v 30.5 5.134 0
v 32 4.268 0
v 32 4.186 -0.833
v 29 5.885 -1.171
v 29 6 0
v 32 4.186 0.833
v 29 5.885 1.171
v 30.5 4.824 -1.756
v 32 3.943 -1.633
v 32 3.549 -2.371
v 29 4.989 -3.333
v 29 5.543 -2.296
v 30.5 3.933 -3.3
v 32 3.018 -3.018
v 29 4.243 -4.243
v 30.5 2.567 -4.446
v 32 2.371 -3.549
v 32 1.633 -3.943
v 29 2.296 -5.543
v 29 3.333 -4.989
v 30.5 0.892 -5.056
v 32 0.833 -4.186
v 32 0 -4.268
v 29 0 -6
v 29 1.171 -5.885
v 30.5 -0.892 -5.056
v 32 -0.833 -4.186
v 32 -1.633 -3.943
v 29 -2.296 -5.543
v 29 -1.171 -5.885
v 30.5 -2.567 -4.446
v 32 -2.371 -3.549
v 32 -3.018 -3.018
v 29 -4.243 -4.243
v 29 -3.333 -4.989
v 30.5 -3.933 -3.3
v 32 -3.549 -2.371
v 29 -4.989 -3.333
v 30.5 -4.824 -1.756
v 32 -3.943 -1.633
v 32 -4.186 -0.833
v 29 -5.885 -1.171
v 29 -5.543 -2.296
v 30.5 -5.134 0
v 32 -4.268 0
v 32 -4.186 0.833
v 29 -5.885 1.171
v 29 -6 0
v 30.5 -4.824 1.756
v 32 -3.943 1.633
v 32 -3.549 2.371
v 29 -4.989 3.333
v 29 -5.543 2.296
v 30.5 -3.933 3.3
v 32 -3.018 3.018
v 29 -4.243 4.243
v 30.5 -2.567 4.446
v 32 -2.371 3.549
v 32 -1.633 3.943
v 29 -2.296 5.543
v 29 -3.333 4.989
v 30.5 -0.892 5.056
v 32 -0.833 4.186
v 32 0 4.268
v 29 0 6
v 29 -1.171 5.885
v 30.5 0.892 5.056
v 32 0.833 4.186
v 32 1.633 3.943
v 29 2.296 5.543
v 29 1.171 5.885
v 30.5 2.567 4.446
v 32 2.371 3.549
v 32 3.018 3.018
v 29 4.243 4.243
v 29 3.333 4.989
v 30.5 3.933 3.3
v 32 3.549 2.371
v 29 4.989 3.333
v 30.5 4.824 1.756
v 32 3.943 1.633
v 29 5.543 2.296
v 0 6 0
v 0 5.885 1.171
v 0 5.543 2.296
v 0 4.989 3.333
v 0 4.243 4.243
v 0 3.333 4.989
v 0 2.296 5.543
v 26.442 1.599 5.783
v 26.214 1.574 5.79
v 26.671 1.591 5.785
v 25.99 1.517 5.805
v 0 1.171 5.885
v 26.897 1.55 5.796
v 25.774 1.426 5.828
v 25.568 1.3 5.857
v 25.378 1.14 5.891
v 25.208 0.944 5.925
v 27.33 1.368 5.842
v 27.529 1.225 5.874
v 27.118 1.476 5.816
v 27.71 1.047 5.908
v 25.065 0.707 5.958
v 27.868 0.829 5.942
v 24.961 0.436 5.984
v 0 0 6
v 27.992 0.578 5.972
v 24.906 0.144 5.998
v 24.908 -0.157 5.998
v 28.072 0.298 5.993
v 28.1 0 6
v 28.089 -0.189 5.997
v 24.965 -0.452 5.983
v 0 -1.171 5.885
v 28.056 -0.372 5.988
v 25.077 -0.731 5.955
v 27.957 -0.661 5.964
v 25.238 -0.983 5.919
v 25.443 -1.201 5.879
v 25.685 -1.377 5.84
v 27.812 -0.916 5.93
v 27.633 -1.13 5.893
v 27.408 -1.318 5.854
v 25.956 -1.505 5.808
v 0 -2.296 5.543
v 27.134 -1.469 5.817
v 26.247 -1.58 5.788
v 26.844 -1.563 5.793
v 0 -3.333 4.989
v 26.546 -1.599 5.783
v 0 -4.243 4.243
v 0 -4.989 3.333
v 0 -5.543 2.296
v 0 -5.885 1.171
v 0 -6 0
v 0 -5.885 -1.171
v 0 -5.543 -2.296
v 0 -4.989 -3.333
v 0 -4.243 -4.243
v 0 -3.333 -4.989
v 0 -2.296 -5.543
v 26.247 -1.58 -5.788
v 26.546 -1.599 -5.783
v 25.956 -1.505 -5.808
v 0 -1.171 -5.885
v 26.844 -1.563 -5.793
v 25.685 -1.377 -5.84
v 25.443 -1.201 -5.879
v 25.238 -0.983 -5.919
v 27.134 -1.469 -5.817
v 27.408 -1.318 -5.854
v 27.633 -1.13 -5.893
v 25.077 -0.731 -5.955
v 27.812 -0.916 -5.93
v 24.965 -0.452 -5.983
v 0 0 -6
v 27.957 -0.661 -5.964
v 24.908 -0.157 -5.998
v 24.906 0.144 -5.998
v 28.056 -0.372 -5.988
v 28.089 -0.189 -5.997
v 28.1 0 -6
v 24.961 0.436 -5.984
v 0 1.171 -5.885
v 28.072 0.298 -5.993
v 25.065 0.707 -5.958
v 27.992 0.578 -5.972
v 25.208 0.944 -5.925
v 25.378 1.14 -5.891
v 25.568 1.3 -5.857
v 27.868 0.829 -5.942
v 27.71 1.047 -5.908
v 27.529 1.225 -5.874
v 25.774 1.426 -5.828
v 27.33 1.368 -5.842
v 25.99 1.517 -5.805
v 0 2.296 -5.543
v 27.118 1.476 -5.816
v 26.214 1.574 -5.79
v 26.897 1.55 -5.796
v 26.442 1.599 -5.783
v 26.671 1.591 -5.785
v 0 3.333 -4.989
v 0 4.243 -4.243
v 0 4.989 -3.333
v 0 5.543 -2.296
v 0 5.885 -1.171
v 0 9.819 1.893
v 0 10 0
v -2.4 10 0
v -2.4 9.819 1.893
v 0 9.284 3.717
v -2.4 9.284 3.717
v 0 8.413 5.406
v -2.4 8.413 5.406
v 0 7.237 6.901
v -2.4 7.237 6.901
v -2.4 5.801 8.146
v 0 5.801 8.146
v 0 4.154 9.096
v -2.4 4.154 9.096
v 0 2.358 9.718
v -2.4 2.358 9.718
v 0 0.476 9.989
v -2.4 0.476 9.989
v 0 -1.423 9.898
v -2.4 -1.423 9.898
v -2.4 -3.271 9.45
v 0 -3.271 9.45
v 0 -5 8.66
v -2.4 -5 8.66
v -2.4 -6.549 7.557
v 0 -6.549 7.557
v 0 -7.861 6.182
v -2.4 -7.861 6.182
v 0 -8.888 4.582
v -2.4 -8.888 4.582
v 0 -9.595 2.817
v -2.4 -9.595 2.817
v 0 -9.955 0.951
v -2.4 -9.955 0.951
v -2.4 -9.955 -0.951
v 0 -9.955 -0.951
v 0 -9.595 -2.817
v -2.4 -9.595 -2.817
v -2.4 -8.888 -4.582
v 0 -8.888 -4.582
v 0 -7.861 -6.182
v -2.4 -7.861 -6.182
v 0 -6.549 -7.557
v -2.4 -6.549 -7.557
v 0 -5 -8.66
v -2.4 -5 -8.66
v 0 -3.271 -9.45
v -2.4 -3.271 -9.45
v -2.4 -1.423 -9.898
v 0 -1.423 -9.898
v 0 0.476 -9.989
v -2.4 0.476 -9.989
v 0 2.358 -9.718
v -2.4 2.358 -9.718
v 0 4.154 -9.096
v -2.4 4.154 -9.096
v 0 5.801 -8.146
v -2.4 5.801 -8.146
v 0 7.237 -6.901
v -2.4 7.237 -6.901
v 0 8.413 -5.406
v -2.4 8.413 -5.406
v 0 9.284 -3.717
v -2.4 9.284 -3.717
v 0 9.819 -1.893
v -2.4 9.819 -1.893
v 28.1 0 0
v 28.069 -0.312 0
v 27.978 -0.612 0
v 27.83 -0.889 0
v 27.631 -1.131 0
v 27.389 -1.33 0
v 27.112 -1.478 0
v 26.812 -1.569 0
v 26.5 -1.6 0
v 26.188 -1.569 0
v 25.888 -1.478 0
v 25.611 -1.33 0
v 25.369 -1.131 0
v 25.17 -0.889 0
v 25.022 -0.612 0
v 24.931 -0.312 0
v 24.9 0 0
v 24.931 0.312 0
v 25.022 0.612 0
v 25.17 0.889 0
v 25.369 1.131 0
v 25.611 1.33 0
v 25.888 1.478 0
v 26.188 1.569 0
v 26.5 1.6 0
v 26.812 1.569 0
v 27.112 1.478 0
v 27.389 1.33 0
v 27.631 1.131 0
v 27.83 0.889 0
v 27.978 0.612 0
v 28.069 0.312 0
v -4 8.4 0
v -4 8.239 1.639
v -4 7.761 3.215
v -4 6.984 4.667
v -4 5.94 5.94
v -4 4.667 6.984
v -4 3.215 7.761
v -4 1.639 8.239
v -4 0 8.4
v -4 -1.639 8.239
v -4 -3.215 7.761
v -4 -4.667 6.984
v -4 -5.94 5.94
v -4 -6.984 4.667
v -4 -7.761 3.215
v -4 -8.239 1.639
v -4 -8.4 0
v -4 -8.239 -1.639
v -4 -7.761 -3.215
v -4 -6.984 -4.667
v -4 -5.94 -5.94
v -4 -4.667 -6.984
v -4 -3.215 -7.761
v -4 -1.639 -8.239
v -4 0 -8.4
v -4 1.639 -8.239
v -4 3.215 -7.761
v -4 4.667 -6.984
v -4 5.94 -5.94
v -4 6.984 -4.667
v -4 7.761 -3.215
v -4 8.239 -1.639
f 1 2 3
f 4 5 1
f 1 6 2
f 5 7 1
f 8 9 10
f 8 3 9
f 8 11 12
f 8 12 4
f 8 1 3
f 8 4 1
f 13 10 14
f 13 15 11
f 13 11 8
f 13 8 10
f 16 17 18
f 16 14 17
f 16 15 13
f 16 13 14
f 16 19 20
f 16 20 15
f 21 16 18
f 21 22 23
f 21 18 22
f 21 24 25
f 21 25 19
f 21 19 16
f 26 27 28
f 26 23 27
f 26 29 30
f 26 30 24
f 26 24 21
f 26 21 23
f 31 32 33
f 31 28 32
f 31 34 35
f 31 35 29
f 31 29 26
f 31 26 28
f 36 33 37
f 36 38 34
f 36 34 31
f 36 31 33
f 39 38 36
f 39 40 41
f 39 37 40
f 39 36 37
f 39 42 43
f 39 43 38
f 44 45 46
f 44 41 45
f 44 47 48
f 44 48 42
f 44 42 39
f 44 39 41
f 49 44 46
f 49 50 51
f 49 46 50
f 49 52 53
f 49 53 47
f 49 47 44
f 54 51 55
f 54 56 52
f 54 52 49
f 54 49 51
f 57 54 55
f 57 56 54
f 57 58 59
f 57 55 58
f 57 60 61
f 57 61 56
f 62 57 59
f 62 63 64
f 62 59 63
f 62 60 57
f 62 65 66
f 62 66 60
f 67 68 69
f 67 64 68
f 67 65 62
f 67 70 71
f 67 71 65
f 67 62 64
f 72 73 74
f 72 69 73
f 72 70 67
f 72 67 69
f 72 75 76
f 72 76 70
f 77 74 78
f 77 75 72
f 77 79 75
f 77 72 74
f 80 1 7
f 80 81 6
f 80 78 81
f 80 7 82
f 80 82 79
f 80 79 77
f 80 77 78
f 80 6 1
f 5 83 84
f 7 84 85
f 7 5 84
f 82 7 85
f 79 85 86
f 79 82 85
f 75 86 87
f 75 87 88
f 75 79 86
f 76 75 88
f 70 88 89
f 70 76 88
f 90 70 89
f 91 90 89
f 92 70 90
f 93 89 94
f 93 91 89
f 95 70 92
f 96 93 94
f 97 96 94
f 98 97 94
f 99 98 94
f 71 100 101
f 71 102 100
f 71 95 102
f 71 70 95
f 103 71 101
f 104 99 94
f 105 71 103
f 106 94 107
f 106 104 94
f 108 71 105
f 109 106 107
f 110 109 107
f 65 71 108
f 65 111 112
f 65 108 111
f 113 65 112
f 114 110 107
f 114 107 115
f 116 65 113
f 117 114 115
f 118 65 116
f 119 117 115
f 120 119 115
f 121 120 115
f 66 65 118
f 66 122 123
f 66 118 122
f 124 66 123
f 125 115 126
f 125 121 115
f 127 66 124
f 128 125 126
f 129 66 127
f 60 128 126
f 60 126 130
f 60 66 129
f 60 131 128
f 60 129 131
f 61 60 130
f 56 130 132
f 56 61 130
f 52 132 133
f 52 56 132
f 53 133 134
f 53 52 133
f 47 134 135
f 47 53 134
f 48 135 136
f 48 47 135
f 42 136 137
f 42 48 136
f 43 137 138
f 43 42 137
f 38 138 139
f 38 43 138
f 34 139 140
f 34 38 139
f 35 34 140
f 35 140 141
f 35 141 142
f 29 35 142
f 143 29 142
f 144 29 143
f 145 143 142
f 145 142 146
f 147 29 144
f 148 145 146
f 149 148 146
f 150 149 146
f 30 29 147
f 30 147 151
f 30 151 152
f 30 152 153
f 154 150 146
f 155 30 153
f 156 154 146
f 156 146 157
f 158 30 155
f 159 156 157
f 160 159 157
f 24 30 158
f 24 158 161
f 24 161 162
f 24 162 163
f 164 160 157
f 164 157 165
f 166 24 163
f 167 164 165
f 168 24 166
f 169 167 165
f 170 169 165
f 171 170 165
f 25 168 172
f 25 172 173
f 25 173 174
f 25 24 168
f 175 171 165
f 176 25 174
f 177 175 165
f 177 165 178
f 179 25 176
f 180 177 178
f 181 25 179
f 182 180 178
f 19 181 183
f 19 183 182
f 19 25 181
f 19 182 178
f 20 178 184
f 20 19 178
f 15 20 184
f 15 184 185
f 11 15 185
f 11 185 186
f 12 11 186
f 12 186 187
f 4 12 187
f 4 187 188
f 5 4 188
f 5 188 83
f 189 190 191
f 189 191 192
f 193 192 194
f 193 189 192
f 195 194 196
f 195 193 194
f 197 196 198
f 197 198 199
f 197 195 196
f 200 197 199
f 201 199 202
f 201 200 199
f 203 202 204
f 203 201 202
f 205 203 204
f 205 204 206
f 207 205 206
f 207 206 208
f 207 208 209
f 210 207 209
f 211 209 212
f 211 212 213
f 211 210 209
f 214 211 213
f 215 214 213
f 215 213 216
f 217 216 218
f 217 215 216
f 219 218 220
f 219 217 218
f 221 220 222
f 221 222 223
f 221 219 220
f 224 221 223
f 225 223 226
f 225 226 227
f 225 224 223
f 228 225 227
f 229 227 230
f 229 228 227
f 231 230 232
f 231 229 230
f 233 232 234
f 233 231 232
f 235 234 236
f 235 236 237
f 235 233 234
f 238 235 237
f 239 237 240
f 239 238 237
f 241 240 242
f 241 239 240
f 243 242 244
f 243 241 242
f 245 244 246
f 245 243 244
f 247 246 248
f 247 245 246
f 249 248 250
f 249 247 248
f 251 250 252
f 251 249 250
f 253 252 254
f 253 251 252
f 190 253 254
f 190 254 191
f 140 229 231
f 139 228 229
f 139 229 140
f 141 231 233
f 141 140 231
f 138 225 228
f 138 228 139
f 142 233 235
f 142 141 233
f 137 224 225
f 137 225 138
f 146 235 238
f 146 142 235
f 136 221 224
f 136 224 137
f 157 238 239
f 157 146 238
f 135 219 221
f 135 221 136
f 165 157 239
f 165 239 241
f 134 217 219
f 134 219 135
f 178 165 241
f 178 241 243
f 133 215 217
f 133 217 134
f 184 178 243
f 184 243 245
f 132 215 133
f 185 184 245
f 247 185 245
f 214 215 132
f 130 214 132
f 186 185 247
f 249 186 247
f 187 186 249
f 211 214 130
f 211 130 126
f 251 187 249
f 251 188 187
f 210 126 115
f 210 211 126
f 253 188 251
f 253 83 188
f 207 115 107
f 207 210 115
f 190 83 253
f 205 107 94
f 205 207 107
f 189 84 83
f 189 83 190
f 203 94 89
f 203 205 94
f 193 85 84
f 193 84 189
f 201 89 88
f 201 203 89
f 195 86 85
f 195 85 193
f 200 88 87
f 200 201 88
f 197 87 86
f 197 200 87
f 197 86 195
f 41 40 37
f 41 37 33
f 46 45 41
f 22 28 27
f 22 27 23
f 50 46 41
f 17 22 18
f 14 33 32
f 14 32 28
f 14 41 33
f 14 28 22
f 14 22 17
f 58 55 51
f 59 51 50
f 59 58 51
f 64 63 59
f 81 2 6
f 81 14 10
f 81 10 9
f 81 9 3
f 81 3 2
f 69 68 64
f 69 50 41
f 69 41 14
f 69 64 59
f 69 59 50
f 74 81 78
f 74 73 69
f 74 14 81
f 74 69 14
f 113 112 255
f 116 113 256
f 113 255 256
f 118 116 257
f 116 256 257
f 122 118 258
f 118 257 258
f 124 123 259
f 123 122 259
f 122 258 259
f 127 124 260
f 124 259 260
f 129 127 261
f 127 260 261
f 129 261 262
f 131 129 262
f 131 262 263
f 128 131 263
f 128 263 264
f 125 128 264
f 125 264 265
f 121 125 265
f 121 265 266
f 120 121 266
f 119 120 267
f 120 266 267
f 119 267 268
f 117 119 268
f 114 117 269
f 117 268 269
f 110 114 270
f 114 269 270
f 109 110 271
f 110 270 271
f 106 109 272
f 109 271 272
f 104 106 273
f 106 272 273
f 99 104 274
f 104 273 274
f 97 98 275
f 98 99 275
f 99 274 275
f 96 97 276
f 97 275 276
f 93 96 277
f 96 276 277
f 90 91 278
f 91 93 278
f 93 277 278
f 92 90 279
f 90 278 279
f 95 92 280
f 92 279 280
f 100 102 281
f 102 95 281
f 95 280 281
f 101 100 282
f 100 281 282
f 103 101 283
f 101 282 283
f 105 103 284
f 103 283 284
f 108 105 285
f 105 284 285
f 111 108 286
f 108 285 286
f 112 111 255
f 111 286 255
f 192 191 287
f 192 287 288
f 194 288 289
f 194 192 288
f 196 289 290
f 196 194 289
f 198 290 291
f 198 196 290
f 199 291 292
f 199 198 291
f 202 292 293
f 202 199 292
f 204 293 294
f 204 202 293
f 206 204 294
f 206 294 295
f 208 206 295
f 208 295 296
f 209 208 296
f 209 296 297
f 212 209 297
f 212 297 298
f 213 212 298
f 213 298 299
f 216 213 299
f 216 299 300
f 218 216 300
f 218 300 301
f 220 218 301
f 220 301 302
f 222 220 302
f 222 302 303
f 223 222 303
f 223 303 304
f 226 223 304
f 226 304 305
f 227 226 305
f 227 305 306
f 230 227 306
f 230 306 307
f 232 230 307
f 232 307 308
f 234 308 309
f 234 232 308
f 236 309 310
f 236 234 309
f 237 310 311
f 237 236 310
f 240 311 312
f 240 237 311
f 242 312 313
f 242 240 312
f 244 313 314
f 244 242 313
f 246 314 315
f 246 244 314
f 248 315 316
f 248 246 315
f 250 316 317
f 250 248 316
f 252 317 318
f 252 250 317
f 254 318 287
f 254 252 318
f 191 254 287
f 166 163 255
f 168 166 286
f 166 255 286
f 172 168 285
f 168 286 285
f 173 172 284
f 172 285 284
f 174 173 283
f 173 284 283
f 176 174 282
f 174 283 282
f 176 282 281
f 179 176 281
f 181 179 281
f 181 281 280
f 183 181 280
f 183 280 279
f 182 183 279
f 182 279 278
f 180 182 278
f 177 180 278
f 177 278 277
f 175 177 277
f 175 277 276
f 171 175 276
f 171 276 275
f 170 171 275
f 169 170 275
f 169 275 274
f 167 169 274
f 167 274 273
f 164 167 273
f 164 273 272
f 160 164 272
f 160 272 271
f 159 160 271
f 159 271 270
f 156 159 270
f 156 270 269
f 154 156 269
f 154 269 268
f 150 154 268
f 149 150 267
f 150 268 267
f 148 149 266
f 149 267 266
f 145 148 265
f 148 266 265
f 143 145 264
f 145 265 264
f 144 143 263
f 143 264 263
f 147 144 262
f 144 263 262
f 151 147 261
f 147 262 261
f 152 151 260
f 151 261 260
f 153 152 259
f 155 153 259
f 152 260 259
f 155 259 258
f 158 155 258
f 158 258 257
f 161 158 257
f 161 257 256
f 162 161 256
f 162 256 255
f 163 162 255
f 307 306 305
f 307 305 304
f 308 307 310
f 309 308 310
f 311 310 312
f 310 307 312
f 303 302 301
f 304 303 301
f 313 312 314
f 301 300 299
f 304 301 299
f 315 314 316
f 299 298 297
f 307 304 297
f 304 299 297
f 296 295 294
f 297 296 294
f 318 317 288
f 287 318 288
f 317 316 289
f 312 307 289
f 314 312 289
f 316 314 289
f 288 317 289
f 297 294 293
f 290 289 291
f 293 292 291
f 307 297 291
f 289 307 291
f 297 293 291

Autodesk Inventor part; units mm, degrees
ref_plane "YZ Plane" through (0, 0, 0) normal (1, 0, 0) x (0, 1, 0)
ref_plane "XZ Plane" through (0, 0, 0) normal (0, 1, 0) x (-1, 0, 0)
sketch "Skizze1" plane through (0, 0, 0) normal (0, 0, 1) x (1, 0, 0)
  line L0 (-4, 0) -> (-4, 10)
  line L1 (-4, 10) -> (0, 10)
  line L2 (0, 10) -> (0, 6)
  line L3 (0, 6) -> (32, 6)
  line L4 (32, 6) -> (32, 0)
  line L5 (-4, 0) -> (32, 0)
  line L6 (-4, 0) -> (17, 0) projected
  line L7 (0, -0.98) -> (0, 3.08) projected
  circle A0 centre (26.5, 0) radius 1.6
  dimension "d0" = 12
  dimension "d1" = 20
  dimension "d2" = 4
  dimension "d3" = 32
  dimension "d5" = 5.5
  dimension "d6" = 3.2
revolve "Körper" add sketch "Skizze1" angle 360 about axis through (-4, 0, 0) along (1, 0, 0) picked at (26.9216, 0.9202) contours L0 L1 L2 L3 L4 L5 A0 | A0 L5
extrude "Bohrung" cut sketch "Skizze1" along normal through all both and the other way through all contours A0 L5 | L5 A0
chamfer "Fase1" distance 1.6 angle 45 1 edges at (-4, -10, 0) measured on face at (-2.6667, 9.9676, -0.8047)
chamfer "Fase2" distance 3 angle 30 1 edges at (32, -6, 0) measured on face at (19.4513, 2.8362, 5.2873)
ref_plane "Work Plane1" through (16, 0, 6) normal (0, 0, 1) x (1, 0, 0)
equation "\"d0\" = NND"
equation "\"d1\" = KOD"
equation "\"d2\" = KOH"
equation "\"d3\" = NLG"
equation "\"d5\" = DIST"
equation "\"d6\" = BOR"
equation "\"d7\" = NND"
equation "\"d9\" = PHH2"
equation "\"d10\" = FAWI2"
equation "\"d16\" = PHH2"
equation "\"d11\" = PHH1"
equation "\"d12\" = FAWI1"
equation "\"d17\" = PHH1"
equation "\"PHH1\" = 3"
equation "\"PHH2\" = 1.6"
equation "\"KOD\" = 20"
equation "\"KOH\" = 4"
equation "\"NND\" = 12"
equation "\"FAWI1\" = 30deg"
equation "\"FAWI2\" = 45deg"
equation "\"DIST\" = 5.5"
equation "\"BOR\" = 3.2"
equation "\"NLG\" = 32"
properties part number "IS 6863 - B12 x 32" material "Stahl, weich"
